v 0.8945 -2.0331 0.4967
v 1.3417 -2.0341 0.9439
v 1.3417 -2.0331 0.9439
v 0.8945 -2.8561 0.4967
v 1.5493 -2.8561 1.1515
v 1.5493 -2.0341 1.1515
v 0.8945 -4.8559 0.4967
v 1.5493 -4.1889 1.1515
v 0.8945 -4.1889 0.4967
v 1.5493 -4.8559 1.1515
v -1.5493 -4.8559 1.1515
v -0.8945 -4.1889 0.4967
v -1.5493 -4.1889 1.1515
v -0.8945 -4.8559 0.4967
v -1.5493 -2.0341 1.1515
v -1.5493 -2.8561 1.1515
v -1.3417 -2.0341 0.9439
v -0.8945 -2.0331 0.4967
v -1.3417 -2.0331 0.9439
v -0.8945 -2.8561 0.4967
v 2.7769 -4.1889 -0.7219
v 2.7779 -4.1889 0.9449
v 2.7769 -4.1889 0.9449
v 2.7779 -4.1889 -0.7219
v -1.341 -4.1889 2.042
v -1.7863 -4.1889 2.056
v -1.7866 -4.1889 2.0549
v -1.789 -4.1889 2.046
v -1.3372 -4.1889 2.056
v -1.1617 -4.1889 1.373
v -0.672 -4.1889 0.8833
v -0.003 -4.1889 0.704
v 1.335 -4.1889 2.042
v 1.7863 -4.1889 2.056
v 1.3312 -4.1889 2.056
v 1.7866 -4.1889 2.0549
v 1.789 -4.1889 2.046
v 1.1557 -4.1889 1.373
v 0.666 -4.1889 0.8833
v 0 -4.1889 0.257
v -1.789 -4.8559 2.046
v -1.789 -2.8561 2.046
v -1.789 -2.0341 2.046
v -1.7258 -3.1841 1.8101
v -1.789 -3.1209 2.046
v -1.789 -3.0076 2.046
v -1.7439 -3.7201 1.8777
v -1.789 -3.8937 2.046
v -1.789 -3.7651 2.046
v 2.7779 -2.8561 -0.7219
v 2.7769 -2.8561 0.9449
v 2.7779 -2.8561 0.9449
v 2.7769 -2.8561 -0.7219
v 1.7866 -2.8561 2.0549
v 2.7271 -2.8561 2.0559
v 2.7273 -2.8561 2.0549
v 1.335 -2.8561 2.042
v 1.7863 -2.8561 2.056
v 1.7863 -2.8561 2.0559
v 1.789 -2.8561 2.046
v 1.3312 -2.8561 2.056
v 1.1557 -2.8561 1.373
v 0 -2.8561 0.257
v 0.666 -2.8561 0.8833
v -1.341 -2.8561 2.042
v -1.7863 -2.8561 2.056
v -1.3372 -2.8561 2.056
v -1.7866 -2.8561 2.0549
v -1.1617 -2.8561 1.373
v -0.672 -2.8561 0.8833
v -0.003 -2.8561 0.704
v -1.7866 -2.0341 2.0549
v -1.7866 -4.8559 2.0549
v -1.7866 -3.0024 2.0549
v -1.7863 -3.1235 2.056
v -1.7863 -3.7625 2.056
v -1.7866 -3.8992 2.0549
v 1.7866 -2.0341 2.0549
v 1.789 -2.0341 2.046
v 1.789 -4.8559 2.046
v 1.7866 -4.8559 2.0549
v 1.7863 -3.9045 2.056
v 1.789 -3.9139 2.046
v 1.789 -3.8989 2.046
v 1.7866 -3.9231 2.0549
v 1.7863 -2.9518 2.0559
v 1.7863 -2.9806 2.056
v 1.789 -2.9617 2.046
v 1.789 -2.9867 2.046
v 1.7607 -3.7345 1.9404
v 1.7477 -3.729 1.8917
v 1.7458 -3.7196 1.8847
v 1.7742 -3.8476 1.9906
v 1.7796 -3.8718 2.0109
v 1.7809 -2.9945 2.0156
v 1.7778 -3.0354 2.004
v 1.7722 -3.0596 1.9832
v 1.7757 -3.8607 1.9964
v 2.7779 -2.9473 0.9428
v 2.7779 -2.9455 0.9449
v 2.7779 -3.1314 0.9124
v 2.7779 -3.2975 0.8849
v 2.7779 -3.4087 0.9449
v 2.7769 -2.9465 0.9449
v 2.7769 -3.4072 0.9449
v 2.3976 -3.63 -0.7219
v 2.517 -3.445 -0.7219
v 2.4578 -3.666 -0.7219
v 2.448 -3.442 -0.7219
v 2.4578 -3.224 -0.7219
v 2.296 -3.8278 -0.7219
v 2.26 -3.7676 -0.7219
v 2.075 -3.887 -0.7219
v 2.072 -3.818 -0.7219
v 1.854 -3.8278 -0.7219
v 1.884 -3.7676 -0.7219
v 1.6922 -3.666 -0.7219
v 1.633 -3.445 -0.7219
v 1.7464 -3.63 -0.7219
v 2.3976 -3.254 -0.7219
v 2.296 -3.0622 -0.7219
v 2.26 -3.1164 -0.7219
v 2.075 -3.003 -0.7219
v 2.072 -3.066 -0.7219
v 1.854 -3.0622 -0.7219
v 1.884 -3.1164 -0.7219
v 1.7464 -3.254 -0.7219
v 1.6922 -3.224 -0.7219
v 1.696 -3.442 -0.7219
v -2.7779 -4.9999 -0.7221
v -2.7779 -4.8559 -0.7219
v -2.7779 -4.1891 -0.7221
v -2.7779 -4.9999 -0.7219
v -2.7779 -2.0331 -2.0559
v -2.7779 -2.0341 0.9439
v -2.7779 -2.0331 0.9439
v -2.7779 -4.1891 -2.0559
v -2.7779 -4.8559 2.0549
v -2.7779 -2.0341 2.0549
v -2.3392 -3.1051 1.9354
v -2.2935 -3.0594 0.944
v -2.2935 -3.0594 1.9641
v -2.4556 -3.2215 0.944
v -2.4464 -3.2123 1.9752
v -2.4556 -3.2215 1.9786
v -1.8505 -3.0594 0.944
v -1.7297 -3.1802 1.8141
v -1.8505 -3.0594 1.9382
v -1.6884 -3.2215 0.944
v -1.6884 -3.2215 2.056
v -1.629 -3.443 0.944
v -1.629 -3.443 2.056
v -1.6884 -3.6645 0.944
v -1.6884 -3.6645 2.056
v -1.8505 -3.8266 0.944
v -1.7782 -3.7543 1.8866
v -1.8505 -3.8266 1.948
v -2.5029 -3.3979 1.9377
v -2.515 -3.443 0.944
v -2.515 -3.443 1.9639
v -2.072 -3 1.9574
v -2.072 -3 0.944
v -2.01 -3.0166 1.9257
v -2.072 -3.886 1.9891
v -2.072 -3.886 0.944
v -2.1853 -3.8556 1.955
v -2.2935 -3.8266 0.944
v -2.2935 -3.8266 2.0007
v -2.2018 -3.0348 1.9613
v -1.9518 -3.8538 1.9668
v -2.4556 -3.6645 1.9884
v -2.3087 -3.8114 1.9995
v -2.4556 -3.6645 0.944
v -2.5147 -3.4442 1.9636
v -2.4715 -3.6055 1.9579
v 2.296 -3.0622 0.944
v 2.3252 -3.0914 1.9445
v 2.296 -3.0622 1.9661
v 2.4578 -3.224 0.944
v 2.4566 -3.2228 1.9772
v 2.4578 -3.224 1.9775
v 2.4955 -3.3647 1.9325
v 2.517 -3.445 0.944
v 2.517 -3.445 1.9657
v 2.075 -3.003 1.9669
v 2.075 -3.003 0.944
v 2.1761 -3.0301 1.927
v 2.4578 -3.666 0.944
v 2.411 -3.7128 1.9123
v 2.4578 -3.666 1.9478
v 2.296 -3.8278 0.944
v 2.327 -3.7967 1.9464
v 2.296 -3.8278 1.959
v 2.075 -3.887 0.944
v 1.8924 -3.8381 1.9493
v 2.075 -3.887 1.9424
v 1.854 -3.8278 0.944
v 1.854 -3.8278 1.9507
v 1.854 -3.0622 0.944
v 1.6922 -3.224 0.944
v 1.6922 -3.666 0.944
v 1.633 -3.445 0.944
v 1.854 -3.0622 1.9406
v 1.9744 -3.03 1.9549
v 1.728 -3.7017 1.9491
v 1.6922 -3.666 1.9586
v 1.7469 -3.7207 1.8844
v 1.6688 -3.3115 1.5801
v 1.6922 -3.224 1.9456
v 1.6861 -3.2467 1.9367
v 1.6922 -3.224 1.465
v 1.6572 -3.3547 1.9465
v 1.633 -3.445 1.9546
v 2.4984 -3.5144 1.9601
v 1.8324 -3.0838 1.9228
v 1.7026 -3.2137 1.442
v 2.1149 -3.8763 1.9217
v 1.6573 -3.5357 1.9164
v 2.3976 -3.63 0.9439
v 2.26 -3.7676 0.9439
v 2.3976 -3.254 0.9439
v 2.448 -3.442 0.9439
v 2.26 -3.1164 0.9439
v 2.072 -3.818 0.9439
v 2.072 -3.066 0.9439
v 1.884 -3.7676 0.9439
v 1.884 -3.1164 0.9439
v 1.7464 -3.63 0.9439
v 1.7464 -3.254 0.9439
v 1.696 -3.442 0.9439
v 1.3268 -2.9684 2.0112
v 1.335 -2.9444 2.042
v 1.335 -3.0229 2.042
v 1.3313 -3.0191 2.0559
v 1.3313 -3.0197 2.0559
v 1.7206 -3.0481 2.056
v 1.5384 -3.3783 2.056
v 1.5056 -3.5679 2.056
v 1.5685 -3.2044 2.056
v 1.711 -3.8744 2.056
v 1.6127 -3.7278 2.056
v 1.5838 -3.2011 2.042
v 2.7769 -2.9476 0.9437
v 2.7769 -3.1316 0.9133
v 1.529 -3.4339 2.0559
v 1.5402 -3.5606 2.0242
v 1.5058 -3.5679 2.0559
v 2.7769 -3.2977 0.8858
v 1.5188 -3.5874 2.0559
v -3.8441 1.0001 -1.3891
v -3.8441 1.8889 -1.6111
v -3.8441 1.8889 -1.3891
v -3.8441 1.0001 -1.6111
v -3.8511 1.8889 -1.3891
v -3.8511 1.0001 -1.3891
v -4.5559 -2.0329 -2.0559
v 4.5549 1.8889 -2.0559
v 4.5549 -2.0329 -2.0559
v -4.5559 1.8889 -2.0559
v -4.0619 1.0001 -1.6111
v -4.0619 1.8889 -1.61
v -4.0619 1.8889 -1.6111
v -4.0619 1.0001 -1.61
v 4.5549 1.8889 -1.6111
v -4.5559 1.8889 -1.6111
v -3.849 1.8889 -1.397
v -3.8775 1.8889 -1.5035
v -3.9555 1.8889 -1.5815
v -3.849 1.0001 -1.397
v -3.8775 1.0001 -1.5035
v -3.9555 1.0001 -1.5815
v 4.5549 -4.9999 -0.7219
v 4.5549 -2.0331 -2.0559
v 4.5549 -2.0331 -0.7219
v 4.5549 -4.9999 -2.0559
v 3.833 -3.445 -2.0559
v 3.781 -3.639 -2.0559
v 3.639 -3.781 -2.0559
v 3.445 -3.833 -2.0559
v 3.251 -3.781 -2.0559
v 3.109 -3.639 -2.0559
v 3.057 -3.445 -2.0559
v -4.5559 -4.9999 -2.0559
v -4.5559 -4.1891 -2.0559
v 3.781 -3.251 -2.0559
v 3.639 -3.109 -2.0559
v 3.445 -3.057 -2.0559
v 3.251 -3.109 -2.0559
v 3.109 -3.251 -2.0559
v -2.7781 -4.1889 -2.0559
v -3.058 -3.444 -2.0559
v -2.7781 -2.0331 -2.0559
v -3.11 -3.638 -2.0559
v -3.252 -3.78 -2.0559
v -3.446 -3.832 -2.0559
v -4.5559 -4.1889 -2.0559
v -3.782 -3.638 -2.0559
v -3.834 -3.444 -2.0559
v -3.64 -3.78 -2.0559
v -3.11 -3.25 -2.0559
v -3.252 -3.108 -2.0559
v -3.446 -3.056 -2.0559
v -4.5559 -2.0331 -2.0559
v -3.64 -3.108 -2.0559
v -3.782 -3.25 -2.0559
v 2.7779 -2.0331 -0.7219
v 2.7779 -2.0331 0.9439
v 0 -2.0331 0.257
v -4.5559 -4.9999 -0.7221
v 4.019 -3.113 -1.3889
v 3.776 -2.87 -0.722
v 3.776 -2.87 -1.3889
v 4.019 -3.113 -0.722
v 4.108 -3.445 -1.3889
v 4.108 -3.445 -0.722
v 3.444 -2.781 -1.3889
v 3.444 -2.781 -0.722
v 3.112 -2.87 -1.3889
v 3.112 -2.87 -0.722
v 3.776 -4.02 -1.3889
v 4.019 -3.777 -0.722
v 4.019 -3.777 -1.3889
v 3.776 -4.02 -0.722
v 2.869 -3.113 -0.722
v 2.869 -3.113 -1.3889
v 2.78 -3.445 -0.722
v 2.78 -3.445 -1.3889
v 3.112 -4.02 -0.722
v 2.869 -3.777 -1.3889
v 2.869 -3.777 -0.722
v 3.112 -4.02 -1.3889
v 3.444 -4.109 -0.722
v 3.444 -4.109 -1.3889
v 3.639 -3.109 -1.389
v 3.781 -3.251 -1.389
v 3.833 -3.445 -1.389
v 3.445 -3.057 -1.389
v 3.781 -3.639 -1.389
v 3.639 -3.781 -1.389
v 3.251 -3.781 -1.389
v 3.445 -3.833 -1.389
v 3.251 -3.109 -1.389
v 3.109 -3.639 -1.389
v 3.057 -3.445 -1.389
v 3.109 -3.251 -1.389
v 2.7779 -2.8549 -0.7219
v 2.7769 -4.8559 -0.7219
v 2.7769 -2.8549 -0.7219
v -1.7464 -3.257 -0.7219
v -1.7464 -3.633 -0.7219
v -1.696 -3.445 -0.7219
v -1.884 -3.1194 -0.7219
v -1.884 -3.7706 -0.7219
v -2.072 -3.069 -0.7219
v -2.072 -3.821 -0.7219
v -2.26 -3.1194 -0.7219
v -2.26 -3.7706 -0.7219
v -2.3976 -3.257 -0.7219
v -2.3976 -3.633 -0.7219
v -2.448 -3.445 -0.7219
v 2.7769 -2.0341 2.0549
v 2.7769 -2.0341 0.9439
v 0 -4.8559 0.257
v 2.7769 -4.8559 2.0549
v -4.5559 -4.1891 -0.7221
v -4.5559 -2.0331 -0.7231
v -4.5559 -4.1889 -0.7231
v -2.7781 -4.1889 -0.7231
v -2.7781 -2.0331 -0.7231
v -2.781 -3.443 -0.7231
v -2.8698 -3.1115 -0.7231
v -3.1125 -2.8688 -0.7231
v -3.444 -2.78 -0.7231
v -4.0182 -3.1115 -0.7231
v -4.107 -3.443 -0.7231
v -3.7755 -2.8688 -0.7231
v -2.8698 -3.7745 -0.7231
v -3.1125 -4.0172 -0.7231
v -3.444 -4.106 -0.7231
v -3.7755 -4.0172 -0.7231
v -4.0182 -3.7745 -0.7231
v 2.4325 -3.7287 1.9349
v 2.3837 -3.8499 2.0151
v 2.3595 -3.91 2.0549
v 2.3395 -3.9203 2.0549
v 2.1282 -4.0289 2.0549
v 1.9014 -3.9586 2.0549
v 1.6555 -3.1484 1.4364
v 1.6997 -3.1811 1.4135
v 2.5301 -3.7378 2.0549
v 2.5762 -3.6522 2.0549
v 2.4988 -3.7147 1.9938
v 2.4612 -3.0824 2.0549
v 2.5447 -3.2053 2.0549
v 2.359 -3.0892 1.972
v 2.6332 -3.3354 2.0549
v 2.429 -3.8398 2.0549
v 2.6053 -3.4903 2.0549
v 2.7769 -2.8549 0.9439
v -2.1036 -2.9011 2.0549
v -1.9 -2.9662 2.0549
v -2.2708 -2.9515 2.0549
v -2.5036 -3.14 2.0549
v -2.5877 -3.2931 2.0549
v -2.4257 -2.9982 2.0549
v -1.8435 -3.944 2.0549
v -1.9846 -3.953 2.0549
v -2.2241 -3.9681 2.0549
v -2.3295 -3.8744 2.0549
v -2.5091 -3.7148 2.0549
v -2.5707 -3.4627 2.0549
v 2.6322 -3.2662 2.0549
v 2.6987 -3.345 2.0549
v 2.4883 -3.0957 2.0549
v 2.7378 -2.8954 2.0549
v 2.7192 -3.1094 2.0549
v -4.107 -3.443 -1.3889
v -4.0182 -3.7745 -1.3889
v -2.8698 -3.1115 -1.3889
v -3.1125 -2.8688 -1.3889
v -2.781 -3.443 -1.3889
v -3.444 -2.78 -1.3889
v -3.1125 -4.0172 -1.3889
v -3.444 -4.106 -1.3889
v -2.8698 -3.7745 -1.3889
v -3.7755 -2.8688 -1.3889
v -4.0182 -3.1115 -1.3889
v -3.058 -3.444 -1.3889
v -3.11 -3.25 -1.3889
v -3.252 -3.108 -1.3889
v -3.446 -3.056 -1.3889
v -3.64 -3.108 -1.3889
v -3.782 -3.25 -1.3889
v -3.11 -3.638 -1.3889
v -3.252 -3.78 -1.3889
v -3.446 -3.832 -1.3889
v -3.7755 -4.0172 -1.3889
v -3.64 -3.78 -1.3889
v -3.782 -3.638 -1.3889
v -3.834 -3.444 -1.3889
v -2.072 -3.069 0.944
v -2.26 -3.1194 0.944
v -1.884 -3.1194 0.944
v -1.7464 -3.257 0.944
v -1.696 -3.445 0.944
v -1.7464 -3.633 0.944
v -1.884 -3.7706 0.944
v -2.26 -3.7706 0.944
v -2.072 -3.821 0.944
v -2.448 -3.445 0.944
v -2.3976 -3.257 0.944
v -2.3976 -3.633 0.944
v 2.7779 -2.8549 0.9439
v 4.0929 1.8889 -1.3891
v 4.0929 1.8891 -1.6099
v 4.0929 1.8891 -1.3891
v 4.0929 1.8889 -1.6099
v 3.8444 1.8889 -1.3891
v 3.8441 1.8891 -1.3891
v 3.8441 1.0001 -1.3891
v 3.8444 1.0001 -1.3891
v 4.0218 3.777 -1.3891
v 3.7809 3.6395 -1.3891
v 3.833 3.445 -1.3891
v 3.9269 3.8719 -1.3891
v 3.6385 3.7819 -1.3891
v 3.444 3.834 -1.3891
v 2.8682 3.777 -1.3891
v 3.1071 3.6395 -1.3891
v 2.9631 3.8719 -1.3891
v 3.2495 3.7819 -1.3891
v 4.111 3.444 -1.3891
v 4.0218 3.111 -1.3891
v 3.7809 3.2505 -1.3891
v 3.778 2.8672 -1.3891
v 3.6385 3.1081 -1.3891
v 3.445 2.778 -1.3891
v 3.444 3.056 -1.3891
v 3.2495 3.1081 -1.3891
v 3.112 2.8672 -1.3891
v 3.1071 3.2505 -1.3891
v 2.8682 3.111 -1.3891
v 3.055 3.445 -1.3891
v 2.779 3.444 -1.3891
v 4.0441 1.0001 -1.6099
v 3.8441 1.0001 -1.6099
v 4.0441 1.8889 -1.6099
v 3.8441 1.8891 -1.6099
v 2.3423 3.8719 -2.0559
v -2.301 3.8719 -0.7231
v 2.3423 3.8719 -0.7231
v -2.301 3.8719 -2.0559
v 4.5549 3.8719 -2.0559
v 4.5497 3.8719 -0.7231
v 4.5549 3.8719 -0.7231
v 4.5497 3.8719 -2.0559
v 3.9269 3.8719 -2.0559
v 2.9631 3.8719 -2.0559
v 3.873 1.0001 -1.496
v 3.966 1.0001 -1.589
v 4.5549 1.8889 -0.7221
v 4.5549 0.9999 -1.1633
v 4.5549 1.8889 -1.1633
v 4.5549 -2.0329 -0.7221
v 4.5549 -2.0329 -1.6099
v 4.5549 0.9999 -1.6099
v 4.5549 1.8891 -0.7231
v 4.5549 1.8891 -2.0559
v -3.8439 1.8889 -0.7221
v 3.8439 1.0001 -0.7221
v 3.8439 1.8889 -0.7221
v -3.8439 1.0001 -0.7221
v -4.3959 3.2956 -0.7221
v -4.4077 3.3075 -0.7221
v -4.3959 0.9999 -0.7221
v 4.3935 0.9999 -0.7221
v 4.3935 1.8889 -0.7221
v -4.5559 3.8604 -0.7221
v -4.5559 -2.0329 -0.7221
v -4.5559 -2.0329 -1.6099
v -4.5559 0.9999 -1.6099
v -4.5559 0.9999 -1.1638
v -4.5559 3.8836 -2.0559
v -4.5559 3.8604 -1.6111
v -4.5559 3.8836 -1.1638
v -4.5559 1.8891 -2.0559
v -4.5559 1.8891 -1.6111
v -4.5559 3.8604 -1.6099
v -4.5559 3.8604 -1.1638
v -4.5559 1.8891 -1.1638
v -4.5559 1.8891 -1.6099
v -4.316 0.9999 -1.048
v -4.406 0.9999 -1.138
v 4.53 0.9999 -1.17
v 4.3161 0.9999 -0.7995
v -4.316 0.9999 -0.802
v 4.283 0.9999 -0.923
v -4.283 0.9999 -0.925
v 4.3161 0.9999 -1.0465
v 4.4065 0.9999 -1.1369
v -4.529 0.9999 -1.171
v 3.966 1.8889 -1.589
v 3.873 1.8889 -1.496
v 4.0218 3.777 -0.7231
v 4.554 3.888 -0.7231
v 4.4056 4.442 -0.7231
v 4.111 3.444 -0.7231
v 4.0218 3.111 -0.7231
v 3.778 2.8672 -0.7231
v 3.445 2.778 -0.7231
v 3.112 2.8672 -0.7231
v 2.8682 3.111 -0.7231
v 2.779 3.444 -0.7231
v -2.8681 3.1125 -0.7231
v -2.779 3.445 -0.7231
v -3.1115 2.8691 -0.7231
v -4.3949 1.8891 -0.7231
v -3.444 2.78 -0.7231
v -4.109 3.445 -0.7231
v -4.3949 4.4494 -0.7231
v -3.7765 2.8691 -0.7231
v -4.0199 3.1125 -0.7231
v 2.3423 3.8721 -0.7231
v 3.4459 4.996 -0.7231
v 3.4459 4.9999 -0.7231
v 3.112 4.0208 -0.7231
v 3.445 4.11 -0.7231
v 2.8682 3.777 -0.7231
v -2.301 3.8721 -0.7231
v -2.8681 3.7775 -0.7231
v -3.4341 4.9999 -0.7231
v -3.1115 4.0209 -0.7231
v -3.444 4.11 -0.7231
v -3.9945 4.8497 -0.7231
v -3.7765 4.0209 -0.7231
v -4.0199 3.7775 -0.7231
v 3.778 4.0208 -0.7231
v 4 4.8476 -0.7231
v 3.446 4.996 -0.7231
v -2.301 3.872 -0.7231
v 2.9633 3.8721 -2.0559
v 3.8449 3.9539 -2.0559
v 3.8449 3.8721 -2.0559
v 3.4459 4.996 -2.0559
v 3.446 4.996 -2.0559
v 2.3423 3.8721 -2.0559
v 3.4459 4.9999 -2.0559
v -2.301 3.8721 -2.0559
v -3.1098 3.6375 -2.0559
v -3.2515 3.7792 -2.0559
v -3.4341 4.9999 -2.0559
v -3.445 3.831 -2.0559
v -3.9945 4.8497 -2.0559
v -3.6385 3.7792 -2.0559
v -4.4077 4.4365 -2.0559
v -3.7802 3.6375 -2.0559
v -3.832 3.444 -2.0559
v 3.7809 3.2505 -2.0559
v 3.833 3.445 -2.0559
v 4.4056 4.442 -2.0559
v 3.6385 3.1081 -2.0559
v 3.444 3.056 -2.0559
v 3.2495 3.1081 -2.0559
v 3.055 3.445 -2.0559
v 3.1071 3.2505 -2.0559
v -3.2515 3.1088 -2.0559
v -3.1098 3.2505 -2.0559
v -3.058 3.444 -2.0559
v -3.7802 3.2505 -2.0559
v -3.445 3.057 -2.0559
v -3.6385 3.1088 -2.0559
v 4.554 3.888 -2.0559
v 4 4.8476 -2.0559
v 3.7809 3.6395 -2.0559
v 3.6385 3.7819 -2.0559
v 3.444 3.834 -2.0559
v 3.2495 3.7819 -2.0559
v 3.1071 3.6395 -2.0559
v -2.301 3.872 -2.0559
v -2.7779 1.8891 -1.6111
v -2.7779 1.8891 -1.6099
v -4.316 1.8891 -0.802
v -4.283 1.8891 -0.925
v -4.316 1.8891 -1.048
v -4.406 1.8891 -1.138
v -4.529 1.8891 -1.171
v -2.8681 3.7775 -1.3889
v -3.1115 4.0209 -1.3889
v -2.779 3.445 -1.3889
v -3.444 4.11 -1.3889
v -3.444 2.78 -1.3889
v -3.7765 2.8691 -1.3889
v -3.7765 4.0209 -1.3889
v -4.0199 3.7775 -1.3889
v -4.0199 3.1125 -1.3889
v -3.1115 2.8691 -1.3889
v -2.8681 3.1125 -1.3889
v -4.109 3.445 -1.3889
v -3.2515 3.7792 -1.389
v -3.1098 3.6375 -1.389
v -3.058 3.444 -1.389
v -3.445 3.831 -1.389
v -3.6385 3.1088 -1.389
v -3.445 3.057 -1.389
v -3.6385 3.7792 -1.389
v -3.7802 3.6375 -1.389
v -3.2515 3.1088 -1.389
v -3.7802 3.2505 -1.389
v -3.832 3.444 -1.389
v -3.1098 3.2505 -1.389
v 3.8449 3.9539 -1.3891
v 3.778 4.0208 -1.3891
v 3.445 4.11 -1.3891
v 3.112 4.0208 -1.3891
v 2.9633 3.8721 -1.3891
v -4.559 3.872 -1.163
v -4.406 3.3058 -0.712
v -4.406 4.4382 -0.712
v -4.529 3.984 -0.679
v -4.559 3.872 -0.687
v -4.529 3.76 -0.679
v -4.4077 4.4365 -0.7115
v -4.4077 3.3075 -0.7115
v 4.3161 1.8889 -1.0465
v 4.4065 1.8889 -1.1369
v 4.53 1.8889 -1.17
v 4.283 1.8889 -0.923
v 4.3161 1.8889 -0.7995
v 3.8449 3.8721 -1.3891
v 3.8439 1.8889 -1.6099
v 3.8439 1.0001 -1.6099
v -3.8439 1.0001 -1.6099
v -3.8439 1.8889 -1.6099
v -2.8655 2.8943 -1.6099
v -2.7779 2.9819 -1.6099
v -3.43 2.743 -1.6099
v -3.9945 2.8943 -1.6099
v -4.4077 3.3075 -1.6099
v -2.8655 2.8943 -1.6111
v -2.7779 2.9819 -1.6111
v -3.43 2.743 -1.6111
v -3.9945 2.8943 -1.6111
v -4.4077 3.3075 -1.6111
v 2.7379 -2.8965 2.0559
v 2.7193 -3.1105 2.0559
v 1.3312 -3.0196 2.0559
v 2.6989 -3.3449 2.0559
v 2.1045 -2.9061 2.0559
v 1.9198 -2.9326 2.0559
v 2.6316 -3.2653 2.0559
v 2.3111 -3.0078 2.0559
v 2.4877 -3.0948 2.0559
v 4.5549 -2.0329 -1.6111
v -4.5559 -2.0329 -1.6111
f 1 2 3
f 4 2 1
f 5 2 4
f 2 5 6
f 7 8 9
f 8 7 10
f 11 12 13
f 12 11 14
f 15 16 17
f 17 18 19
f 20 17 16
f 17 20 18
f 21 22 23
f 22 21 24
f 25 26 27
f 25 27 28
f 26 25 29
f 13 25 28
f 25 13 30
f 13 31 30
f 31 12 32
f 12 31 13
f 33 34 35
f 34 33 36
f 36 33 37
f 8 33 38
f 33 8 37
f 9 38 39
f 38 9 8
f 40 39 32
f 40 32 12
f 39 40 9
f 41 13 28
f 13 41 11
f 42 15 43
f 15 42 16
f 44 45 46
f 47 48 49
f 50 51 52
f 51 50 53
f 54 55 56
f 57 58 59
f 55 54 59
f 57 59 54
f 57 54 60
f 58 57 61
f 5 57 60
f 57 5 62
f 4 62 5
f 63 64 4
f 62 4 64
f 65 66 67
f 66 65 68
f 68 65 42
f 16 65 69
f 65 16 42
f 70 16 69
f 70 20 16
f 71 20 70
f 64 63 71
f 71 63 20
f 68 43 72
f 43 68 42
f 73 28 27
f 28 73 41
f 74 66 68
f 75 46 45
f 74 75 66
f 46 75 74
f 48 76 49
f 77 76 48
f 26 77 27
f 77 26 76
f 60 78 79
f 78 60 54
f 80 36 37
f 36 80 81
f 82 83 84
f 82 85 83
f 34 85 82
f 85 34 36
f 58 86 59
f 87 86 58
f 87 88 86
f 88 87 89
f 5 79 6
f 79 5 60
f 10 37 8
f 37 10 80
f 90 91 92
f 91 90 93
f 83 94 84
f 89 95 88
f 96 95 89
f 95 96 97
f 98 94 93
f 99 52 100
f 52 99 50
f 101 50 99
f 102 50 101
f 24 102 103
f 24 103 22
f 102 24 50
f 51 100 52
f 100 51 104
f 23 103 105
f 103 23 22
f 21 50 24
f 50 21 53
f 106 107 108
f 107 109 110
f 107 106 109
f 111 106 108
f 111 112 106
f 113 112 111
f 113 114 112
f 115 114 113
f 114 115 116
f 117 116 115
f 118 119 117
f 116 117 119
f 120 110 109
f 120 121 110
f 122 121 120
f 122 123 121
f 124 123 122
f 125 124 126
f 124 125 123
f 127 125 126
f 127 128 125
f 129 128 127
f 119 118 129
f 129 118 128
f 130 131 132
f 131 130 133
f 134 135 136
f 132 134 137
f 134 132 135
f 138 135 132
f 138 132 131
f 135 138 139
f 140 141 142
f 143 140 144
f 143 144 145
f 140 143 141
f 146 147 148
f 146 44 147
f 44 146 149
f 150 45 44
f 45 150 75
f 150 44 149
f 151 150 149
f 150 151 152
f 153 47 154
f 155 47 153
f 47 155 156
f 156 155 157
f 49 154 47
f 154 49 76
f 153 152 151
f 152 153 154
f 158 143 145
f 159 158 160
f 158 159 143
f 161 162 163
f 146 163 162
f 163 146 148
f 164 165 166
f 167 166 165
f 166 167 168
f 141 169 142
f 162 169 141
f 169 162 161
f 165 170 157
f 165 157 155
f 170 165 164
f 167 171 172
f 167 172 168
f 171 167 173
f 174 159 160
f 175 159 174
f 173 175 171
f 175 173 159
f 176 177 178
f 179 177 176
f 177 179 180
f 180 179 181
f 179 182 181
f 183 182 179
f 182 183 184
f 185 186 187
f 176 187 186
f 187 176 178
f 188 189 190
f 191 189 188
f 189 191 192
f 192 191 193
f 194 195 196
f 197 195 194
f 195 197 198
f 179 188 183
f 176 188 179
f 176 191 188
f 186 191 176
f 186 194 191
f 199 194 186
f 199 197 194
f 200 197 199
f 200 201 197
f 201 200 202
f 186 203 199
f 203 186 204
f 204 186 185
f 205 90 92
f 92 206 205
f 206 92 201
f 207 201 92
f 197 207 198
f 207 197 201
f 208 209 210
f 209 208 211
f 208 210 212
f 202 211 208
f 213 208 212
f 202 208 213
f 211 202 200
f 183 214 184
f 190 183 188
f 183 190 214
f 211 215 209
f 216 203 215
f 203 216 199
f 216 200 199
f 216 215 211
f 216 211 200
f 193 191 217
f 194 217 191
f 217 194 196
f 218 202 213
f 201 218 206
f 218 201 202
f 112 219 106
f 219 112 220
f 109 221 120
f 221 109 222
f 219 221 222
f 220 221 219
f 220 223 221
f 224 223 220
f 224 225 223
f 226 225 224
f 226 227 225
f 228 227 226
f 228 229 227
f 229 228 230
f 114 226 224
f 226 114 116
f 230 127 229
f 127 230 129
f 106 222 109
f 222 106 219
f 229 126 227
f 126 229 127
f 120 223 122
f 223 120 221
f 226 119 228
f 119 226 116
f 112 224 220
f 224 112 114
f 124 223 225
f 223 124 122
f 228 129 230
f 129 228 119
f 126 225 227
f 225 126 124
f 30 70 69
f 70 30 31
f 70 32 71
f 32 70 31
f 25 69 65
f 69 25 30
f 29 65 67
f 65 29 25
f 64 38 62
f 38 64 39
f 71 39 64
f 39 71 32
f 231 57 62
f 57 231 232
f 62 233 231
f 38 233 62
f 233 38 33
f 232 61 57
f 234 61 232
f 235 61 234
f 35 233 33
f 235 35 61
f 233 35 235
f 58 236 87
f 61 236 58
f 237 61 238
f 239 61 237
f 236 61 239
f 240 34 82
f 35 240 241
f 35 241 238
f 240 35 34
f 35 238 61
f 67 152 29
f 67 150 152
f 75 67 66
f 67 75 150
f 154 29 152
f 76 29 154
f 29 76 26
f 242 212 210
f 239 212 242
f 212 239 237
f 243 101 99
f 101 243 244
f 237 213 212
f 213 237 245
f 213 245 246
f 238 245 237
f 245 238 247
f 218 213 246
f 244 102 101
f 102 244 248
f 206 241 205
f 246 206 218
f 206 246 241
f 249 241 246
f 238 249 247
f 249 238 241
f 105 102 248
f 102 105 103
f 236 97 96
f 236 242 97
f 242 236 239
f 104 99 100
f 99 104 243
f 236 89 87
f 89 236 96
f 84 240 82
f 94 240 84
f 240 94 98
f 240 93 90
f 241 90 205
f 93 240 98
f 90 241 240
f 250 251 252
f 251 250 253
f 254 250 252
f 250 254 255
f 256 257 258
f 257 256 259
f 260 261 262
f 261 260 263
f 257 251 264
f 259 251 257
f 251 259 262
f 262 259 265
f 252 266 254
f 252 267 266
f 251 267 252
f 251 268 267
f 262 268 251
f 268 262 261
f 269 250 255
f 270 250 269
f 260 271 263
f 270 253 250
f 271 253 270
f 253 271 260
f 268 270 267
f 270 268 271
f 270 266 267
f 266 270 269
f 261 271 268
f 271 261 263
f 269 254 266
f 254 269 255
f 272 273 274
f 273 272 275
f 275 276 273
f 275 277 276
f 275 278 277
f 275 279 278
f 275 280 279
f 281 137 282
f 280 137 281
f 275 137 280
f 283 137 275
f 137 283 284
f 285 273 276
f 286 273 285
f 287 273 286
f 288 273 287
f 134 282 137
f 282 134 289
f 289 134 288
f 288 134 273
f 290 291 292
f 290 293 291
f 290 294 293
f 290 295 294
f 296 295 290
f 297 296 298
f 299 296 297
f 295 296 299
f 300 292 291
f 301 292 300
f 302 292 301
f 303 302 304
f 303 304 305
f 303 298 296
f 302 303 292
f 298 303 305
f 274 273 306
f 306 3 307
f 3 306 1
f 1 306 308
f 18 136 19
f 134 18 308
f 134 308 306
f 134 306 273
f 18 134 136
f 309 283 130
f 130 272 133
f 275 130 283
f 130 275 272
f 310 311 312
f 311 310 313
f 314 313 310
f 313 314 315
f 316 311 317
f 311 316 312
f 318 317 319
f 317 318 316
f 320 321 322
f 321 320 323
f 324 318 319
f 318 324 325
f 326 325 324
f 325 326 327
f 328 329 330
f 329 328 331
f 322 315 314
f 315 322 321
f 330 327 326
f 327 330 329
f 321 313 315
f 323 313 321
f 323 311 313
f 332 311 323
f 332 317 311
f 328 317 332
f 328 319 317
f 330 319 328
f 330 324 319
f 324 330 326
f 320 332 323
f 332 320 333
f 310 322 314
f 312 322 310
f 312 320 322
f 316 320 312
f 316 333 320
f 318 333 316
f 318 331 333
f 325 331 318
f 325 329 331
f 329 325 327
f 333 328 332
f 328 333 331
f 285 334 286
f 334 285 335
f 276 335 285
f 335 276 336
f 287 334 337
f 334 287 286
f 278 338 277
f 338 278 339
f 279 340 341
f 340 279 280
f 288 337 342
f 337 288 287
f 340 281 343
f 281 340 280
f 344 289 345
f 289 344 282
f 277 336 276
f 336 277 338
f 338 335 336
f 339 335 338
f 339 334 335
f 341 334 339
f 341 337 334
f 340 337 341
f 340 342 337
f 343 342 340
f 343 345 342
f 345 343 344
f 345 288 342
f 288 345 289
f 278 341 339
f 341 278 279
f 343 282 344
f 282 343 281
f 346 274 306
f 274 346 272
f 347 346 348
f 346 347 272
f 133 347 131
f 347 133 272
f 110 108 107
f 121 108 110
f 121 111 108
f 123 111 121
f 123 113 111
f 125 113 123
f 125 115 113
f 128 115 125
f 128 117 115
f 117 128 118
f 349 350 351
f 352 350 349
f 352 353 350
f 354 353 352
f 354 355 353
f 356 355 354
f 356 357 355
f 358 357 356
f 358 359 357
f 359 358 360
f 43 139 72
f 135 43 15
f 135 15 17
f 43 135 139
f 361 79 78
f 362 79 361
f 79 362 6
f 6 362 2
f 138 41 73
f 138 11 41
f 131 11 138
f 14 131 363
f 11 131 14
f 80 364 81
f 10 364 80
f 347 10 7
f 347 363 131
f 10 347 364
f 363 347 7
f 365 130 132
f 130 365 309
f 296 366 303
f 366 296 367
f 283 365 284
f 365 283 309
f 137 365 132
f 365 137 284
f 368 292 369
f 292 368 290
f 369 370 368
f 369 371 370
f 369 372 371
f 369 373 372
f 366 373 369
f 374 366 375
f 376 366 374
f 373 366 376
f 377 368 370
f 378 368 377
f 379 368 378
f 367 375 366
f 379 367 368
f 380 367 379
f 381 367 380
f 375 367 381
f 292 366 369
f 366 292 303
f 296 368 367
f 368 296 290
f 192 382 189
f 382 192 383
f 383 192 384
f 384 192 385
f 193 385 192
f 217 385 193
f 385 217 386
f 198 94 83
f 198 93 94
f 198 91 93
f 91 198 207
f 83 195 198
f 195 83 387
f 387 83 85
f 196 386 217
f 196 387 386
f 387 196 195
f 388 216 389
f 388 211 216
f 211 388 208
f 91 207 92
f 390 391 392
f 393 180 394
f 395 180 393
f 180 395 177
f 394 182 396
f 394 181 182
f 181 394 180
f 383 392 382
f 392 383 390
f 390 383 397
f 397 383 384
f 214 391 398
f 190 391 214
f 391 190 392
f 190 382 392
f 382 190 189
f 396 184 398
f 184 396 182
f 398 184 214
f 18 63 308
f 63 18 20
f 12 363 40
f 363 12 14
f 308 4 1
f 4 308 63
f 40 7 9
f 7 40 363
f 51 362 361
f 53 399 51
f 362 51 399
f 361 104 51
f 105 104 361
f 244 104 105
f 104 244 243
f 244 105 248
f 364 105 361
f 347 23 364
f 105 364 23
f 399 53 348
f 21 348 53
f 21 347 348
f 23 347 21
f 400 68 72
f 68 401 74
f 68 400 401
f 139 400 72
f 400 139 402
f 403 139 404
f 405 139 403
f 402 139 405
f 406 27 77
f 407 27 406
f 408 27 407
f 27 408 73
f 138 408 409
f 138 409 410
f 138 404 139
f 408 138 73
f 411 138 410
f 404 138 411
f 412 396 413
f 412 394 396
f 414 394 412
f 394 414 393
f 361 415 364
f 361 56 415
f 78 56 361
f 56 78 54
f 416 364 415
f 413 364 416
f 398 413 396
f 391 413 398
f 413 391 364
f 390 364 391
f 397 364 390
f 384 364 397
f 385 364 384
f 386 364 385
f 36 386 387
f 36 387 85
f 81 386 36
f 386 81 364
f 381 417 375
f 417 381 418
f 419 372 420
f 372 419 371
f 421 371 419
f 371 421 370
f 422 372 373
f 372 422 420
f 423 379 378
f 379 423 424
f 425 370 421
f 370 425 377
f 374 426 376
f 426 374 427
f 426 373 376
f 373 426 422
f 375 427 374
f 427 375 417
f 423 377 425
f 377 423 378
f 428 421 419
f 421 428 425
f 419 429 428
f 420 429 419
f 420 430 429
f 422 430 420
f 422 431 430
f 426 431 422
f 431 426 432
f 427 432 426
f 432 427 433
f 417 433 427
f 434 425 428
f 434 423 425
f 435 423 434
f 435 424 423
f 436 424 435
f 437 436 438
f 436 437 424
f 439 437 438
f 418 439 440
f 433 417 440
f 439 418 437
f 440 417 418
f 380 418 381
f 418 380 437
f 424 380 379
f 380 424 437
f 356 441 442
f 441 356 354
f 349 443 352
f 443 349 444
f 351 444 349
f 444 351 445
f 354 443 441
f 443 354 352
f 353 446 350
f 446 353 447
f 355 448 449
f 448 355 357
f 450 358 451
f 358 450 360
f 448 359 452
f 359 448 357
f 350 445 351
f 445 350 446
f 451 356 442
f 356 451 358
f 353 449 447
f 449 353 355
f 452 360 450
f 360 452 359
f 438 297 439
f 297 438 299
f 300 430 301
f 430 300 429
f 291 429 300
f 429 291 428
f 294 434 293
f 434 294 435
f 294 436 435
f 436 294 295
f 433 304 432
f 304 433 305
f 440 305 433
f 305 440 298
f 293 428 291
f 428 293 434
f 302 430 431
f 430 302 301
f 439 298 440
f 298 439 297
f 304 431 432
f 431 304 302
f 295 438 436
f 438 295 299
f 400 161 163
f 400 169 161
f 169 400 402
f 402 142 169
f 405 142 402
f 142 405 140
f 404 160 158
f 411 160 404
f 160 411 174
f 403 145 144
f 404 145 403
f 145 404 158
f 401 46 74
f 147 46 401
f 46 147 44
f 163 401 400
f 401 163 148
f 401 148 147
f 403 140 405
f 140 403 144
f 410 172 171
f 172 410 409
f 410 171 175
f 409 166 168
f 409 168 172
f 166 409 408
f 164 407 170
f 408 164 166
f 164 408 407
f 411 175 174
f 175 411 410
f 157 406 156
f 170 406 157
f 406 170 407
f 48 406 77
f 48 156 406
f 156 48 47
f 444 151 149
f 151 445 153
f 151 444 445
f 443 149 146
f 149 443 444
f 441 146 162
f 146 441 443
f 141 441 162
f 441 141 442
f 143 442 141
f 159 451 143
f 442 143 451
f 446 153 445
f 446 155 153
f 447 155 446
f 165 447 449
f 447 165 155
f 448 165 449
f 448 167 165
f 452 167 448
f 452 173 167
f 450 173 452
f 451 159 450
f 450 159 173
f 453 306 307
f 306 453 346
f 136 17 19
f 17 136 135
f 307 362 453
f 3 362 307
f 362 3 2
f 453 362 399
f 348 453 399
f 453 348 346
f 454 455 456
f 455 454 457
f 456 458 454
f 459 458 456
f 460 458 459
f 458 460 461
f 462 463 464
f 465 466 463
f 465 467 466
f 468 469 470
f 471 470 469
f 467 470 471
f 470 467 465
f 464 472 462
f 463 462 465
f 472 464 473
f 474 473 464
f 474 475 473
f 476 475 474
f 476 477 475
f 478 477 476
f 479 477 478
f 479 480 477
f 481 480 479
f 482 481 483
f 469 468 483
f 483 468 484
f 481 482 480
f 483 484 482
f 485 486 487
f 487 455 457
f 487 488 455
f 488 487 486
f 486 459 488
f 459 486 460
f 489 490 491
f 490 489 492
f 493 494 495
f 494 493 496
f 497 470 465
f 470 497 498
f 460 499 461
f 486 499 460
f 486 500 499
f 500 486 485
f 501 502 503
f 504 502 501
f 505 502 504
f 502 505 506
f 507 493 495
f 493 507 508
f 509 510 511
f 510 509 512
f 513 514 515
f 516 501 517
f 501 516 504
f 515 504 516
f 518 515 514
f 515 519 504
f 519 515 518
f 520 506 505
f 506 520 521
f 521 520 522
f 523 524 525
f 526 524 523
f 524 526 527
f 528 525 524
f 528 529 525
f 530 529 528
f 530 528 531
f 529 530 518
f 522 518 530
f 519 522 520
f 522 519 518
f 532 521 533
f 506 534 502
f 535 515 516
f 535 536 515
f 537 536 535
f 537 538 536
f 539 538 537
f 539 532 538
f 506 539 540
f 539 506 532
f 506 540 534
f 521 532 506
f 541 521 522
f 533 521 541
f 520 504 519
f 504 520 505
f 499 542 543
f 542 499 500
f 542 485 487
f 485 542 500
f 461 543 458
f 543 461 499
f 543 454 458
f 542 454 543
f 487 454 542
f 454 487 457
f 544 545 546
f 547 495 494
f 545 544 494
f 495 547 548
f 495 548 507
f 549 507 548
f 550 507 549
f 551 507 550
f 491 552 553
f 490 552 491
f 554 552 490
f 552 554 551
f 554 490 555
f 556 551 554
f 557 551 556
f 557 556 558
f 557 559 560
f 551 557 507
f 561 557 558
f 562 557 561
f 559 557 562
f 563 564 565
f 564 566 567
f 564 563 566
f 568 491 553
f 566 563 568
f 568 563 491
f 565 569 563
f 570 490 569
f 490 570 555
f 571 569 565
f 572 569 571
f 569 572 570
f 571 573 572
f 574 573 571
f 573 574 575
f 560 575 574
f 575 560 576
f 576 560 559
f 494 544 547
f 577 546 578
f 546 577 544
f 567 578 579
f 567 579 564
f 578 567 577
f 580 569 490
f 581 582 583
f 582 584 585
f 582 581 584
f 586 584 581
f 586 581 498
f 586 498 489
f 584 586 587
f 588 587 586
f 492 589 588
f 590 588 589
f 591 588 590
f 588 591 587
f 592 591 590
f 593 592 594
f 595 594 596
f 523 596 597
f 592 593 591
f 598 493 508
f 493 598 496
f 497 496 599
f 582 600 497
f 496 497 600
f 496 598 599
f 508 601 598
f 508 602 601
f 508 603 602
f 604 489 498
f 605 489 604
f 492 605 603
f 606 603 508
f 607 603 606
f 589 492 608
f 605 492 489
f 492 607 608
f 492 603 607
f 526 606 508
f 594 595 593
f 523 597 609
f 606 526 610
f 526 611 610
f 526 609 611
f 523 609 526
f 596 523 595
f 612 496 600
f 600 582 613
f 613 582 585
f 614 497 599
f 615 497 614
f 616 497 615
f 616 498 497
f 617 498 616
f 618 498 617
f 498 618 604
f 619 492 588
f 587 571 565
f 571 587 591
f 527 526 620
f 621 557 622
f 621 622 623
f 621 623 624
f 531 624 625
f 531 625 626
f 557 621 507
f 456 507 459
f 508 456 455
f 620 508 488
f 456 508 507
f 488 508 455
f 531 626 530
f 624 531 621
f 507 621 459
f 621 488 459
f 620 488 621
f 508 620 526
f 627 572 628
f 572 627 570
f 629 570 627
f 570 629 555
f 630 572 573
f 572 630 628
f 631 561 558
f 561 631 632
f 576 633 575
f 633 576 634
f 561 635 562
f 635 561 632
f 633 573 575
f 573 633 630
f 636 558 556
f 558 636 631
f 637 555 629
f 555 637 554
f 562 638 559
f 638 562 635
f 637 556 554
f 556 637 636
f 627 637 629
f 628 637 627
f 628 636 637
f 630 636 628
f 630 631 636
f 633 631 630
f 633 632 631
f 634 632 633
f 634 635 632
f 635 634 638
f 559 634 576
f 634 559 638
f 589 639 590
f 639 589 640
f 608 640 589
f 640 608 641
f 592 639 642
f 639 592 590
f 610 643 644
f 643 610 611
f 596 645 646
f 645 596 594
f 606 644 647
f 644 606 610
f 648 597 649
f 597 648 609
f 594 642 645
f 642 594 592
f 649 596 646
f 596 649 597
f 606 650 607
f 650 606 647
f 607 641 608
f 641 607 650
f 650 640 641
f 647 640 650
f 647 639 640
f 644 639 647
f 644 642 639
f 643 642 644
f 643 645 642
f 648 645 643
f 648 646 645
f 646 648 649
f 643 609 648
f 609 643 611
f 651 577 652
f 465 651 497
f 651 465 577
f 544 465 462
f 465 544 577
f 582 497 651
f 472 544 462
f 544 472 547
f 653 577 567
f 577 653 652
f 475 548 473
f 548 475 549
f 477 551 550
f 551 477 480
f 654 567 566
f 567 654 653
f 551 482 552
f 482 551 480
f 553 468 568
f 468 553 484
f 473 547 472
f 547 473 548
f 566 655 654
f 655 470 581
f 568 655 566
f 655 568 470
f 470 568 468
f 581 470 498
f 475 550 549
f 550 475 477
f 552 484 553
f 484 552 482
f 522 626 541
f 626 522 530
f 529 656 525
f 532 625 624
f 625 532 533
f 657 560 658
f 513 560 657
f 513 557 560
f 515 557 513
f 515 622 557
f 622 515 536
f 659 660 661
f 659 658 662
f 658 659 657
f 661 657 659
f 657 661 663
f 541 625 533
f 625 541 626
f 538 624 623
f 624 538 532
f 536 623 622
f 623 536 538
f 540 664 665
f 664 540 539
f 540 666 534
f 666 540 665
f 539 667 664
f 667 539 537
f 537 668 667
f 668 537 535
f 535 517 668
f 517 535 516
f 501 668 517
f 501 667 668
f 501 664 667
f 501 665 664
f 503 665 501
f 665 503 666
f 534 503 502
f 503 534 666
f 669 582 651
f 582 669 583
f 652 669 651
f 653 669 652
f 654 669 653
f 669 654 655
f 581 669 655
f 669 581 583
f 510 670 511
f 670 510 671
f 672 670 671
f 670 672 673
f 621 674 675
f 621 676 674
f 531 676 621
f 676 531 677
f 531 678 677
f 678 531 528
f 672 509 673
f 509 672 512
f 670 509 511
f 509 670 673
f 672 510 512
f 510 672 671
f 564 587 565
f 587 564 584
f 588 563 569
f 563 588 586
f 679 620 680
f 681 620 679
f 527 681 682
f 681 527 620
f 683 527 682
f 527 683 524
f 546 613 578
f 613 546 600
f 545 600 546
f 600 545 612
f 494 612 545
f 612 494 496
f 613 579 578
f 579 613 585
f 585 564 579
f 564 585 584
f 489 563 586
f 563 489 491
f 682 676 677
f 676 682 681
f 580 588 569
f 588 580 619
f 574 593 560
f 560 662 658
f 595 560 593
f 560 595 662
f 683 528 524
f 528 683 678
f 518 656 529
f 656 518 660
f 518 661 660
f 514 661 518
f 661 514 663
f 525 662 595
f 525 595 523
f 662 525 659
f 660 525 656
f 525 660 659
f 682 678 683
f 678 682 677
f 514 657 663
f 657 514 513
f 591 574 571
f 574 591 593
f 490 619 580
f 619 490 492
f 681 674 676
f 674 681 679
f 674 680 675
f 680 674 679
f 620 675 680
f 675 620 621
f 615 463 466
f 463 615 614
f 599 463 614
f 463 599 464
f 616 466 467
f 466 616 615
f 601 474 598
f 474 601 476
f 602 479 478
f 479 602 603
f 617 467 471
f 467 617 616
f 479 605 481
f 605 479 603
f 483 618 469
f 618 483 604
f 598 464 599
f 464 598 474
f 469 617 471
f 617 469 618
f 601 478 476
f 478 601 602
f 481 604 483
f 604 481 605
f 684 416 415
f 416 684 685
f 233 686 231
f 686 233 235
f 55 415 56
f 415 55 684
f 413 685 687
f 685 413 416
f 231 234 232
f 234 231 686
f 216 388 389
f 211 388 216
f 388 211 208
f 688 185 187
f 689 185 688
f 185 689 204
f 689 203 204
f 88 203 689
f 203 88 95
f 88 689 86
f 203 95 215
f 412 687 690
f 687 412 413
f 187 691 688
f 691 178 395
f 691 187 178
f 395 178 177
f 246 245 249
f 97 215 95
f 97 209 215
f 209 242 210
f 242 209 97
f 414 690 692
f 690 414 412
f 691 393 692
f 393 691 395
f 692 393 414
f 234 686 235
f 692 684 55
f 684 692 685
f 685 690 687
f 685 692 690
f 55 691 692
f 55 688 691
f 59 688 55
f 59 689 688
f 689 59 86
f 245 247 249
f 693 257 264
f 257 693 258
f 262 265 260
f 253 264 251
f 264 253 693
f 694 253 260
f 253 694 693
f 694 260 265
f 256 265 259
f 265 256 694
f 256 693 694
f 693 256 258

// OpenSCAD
intersection() {
  translate([-0.0005, 0, -0.0005])
  cube(size = [10.9328, 11.9998, 4.9328], center = true);

  union() {
    difference() {
      difference() {
        union() {
          translate([1.21353e-15, -3.5225, 2.046])
          rotate([180, 90, -90])
          cylinder(h = 1.3328, r1 = 1.789, r2 = 1.789, center = true, $fn = 12);
        
          translate([0, -3.5225, 0.1115])
          cube(size = [5.5558, 1.3328, 1.6668], center = true);
        }
      
        union() {
          translate([-2.072, -3.443, 8.689])
          cylinder(h = 18.8219, r1 = 0.443, r2 = 0.443, center = true, $fn = 12);
        
          translate([2.075, -3.445, 9.522])
          cylinder(h = 17.1559, r1 = 0.442, r2 = 0.442, center = true, $fn = 12);
        }
      }
    
      union() {
        translate([2.072, -3.442, -0.2225])
        rotate([180, 0, 180])
        cylinder(h = 2.3329, r1 = 0.376, r2 = 0.376, center = true, $fn = 12);
      
        translate([-0.003, -3.5225, 2.042])
        rotate([180, 90, -90])
        cylinder(h = 1.3329, r1 = 1.338, r2 = 1.338, center = true, $fn = 12);
      
        translate([0.8885, -10.0665, 10.0785])
        cube(size = [7.3329, 16.0669, 16.0449], center = true);
      
        translate([2.55917, -3.34399, 2.00798])
        rotate([180, 48, -168])
        cylinder(h = 36.1999, r1 = 0.685, r2 = 0.685, center = true, $fn = 12);
      }
    }
  
    difference() {
      translate([-3.953, 1.4445, -1.7225])
      cube(size = [0.2178, 0.8888, 0.6668], center = true);
    
      translate([-4.062, -8.1055, -1.397])
      rotate([180, 90, -90])
      cylinder(h = 19.9889, r1 = 0.213, r2 = 0.213, center = true, $fn = 12);
    }
  
    difference() {
      difference() {
        translate([0.8885, -3.5165, -0.556])
        cube(size = [7.3328, 2.9668, 2.9998], center = true);
      
        translate([3.444, -3.445, -1.0555])
        cylinder(h = 0.6669, r1 = 0.664, r2 = 0.664, center = true, $fn = 12);
      }
    
      union() {
        translate([3.445, -3.445, -1.7225])
        cylinder(h = 0.6669, r1 = 0.388, r2 = 0.388, center = true, $fn = 12);
      
        translate([0.8885, -3.5165, 0.667])
        cube(size = [7.3329, 2.9669, 2.7779], center = true);
      }
    }
  
    translate([-0.0005, -0.072, -1.8335])
    cube(size = [9.1108, 3.9218, 0.4448], center = true);
  
    intersection() {
      difference() {
        union() {
          translate([0, -3.445, 8.022])
          cube(size = [5.5558, 2.8218, 20.1558], center = true);
        
          translate([6.772, -4.5945, -9.411])
          cube(size = [22.6558, 0.8108, 17.3778], center = true);
        
          translate([-3.667, -3.111, -1.3895])
          cube(size = [1.7778, 2.1558, 1.3328], center = true);
        }
      
        union() {
          translate([0, 0, 2.046])
          rotate([180, 90, -90])
          cylinder(h = 36.1999, r1 = 1.789, r2 = 1.789, center = true, $fn = 12);
        
          intersection() {
            translate([1.79074, -0.171296, -0.375845])
            rotate([8.53774e-07, 49, -85])
            cylinder(h = 36.1999, r1 = 0.706, r2 = 0.706, center = true, $fn = 12);
          
            translate([0.149138, -3.86342, 0.756219])
            rotate([-0, 49, 12])
            cylinder(h = 36.1999, r1 = 0.686, r2 = 0.686, center = true, $fn = 12);
          }
        
          translate([2.075, -3.445, 8.689])
          cylinder(h = 18.8219, r1 = 0.442, r2 = 0.442, center = true, $fn = 12);
        }
      }
    
      difference() {
        difference() {
          difference() {
            translate([-0.8895, -3.5165, -0.0005])
            cube(size = [7.3328, 2.9668, 4.1108], center = true);
          
            translate([-3.444, -3.443, -1.0555])
            cylinder(h = 0.6669, r1 = 0.663, r2 = 0.663, center = true, $fn = 12);
          }
        
          union() {
            translate([-2.072, -3.445, 0])
            cylinder(h = 36.1999, r1 = 0.376, r2 = 0.376, center = true, $fn = 12);
          
            translate([-3.446, -3.444, 0])
            cylinder(h = 36.1999, r1 = 0.388, r2 = 0.388, center = true, $fn = 12);
          }
        }
      
        union() {
          intersection() {
            translate([-1.81623, -3.75091, 2.03847])
            rotate([180, 49, 129])
            cylinder(h = 36.1999, r1 = 0.623, r2 = 0.623, center = true, $fn = 12);
          
            translate([-0.892169, -0.100017, -0.458861])
            rotate([-180, 50, -109])
            cylinder(h = 36.1999, r1 = 0.704, r2 = 0.704, center = true, $fn = 12);
          }
        
          translate([-2.072, -3.443, 9.522])
          cylinder(h = 17.1559, r1 = 0.443, r2 = 0.443, center = true, $fn = 12);
        }
      }
    }
  
    difference() {
      union() {
        translate([3.9685, 2.436, -1.4995])
        cube(size = [0.2488, 2.8718, 0.2208], center = true);
      
        translate([-0.0005, -0.5165, -1.166])
        cube(size = [9.1108, 3.0328, 0.8878], center = true);
      
        difference() {
          translate([0, -2.444, -0.556])
          cube(size = [5.5558, 0.8218, 2.9998], center = true);
        
          translate([2.94555e-15, -8.55, 2.046])
          rotate([180, 90, -90])
          cylinder(h = 19.0999, r1 = 1.789, r2 = 1.789, center = true, $fn = 12);
        }
      }
    
      translate([4.093, 1.4445, -1.369])
      rotate([180, 90, -90])
      cylinder(h = 0.8889, r1 = 0.254, r2 = 0.254, center = true, $fn = 12);
    }
  
    intersection() {
      union() {
        difference() {
          difference() {
            translate([6.772, 3.4445, -1.3895])
            cube(size = [22.6558, 3.1108, 1.3328], center = true);
          
            translate([-3.444, 3.445, 8.3555])
            cylinder(h = 19.4889, r1 = 0.665, r2 = 0.665, center = true, $fn = 12);
          }
        
          union() {
            translate([-3.445, 3.444, -9.7445])
            cylinder(h = 16.7109, r1 = 0.387, r2 = 0.387, center = true, $fn = 12);
          
            translate([3.445, 3.444, 0])
            cylinder(h = 36.1999, r1 = 0.666, r2 = 0.666, center = true, $fn = 12);
          }
        }
      
        translate([-4.529, 1.4835, -0.925])
        rotate([180, 90, -90])
        cylinder(h = 7.0328, r1 = 0.246, r2 = 0.246, center = true, $fn = 12);
      
        translate([4.53, -0.072, -0.923])
        rotate([180, 90, -90])
        cylinder(h = 3.9218, r1 = 0.247, r2 = 0.247, center = true, $fn = 12);
      
        translate([3.3115, 4.436, -1.7225])
        cube(size = [1.0668, 1.1278, 0.6668], center = true);
      
        translate([0, 1.4445, -1.166])
        cube(size = [7.6878, 0.8888, 0.8878], center = true);
      }
    
      union() {
        translate([0.008, 4.436, -1.3895])
        cube(size = [6.8758, 1.1278, 1.3328], center = true);
      
        translate([-7.661, 2.8805, -1.8335])
        cube(size = [20.8778, 1.9828, 0.4448], center = true);
      
        translate([3.446, 3.888, 8.022])
        cylinder(h = 20.1558, r1 = 1.108, r2 = 1.108, center = true, $fn = 12);
      
        translate([-3.43, 3.872, 8.022])
        cylinder(h = 20.1558, r1 = 1.129, r2 = 1.129, center = true, $fn = 12);
      
        translate([-0.0005, 0.9195, -1.166])
        cube(size = [9.1108, 5.9048, 0.8878], center = true);
      }
    }
  
    difference() {
      translate([0.8885, 2.8805, -1.7225])
      cube(size = [7.3328, 1.9828, 0.6668], center = true);
    
      translate([3.444, 3.445, 8.022])
      cylinder(h = 20.1559, r1 = 0.389, r2 = 0.389, center = true, $fn = 12);
    }
  
    intersection() {
      difference() {
        translate([1.79074, -0.171296, -0.375845])
        rotate([8.53774e-07, 49, -85])
        cylinder(h = 36.1998, r1 = 0.706, r2 = 0.706, center = true, $fn = 12);
      
        translate([1.53715, -2.57243, 3.3278])
        rotate([180, 48, 120])
        cylinder(h = 36.1999, r1 = 0.649, r2 = 0.649, center = true, $fn = 12);
      }
    
      difference() {
        translate([0, -3.856, 0.667])
        cube(size = [5.5558, 1.9998, 2.7778], center = true);
      
        translate([2.075, -3.445, 8.022])
        cylinder(h = 20.1559, r1 = 0.442, r2 = 0.442, center = true, $fn = 12);
      }
    }
  }
}
